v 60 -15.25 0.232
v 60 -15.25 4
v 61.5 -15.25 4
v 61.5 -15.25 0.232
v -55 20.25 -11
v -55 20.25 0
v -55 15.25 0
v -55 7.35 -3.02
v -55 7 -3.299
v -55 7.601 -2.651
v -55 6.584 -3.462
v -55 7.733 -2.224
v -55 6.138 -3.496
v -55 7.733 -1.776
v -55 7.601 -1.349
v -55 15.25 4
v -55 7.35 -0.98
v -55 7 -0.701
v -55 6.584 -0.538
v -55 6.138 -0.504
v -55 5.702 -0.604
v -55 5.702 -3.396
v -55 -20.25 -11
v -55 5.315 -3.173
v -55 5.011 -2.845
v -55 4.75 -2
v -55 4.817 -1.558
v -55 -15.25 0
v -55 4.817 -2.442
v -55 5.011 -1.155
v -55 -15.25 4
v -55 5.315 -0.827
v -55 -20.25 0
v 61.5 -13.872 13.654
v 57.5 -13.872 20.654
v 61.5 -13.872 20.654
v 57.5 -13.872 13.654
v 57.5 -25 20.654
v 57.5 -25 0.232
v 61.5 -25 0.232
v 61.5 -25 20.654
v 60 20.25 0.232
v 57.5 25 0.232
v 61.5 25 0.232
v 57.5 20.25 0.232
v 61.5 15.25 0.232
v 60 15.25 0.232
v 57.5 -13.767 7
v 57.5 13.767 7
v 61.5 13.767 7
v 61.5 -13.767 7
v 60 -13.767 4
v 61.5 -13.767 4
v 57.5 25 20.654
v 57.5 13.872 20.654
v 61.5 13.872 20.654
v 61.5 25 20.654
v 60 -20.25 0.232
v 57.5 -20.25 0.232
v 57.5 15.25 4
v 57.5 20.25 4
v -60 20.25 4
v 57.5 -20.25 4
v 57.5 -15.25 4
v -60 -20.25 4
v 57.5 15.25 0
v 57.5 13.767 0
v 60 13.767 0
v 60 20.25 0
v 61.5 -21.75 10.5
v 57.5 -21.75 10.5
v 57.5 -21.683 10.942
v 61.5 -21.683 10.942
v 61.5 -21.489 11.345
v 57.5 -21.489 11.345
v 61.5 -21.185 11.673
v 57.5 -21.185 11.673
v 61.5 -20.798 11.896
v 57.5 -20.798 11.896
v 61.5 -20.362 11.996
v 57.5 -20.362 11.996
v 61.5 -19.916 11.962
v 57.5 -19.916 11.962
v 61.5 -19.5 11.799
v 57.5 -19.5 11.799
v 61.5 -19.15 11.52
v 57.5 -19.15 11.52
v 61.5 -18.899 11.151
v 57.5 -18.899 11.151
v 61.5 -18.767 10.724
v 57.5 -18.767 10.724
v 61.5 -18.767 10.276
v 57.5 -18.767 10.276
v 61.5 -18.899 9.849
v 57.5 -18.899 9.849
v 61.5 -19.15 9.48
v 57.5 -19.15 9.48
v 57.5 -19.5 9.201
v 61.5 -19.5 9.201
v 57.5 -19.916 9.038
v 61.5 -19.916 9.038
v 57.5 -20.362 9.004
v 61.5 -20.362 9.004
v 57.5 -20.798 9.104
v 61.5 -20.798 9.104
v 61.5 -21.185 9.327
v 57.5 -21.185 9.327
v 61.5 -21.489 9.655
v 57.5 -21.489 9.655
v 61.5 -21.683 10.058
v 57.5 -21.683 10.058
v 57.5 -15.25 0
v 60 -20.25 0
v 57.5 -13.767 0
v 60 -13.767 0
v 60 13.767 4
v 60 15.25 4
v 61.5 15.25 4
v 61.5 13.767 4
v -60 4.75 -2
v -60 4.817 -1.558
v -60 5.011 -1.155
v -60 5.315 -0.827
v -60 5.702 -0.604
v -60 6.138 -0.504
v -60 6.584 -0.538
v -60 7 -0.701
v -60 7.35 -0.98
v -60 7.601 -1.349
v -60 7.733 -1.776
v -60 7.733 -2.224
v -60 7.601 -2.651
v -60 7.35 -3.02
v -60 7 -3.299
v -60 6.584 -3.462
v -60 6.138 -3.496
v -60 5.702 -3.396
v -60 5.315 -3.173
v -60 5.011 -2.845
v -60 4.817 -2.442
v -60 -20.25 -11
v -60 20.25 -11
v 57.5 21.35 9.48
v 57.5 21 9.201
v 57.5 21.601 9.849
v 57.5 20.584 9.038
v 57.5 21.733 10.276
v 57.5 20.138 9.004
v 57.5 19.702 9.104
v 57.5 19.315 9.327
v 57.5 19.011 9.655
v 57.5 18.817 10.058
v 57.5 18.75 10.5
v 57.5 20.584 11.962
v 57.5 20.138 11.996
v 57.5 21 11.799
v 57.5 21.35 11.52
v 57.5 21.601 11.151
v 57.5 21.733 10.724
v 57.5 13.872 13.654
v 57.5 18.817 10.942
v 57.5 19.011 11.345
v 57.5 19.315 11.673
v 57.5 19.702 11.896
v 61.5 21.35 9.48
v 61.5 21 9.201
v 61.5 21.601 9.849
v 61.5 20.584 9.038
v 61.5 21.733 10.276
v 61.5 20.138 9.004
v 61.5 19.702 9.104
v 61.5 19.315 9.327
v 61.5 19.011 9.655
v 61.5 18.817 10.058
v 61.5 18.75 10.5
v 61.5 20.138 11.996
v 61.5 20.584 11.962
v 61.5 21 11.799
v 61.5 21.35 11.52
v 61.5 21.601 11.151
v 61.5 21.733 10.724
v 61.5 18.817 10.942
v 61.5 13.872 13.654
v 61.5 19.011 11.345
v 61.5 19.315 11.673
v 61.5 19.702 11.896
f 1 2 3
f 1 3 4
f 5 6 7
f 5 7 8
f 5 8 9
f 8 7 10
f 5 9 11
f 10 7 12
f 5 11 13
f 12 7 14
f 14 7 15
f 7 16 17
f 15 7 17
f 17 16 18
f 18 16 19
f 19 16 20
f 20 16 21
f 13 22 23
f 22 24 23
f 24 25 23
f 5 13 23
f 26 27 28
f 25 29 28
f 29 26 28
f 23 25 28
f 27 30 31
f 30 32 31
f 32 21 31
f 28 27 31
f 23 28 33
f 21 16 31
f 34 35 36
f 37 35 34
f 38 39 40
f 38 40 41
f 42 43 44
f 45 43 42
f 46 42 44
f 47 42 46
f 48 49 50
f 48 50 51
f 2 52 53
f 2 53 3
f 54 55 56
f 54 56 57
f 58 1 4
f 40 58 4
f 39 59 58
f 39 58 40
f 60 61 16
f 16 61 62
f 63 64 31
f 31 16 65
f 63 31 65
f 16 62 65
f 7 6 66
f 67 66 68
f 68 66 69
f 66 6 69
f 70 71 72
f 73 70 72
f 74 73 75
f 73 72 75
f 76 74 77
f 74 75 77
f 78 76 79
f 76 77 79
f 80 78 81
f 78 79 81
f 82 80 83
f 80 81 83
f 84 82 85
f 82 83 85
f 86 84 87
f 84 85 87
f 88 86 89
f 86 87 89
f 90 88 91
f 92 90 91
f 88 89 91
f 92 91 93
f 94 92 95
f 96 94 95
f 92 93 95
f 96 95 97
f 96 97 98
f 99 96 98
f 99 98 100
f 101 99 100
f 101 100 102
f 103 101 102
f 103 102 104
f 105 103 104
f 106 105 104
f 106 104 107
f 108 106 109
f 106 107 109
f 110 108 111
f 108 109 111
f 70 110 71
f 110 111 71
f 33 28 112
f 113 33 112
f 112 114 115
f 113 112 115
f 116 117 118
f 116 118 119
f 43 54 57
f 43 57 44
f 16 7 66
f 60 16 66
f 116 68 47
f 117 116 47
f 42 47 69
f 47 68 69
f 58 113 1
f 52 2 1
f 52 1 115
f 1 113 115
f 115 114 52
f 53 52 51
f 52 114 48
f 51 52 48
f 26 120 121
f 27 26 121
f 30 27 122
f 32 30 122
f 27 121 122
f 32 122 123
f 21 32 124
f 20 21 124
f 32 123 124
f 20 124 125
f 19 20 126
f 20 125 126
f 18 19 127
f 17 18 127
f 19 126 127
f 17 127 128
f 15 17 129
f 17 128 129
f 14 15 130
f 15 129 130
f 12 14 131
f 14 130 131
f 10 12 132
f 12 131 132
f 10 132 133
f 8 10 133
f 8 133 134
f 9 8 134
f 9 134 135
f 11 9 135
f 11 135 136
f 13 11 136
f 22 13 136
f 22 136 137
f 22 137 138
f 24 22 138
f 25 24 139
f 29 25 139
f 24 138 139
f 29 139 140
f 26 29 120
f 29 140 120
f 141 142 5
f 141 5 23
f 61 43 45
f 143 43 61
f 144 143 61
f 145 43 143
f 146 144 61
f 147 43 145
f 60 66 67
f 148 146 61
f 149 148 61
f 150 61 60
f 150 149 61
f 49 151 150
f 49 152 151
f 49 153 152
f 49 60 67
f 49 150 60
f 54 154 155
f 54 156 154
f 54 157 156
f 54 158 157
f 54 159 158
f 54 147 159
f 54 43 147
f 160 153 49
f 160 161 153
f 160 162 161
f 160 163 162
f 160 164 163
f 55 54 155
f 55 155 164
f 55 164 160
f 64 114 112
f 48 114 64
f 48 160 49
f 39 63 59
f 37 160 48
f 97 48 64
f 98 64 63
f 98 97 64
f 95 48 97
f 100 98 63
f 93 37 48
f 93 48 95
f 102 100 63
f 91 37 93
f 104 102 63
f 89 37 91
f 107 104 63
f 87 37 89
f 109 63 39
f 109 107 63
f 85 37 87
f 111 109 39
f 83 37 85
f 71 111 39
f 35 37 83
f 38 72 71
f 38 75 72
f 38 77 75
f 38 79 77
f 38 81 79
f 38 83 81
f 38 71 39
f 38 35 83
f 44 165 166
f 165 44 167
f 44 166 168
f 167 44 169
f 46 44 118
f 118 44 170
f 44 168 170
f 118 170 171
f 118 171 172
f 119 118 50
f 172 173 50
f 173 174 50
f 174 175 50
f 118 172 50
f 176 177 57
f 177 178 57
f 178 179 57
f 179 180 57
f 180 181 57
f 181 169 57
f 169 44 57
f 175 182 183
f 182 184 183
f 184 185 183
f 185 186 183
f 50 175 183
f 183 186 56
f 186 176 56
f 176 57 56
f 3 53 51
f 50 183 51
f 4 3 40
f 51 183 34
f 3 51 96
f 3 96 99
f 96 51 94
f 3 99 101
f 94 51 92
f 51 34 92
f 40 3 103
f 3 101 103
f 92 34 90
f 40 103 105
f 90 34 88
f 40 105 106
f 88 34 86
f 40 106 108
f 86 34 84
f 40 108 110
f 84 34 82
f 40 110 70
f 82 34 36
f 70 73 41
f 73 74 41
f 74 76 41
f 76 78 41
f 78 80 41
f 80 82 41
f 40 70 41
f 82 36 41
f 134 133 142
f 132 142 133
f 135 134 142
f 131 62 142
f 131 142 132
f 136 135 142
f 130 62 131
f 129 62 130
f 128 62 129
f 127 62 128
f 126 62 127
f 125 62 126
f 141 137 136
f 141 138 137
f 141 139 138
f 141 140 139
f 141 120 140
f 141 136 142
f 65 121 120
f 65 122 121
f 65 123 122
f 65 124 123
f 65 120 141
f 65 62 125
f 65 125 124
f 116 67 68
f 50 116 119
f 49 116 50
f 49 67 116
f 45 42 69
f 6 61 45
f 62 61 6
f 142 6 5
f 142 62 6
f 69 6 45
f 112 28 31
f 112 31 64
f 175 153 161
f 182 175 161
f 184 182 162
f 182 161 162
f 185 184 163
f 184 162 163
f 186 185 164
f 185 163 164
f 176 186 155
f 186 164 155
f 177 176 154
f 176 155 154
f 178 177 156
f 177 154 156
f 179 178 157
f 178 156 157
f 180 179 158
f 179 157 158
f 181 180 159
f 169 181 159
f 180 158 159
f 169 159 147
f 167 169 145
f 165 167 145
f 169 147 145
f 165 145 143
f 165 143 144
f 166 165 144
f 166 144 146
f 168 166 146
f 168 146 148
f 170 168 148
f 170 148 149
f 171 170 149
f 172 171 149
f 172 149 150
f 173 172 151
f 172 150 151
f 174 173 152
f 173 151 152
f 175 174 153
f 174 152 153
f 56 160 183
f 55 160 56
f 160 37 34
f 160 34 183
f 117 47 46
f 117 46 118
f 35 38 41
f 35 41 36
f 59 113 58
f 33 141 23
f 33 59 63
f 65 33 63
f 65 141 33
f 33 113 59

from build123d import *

# Parameters (mm, degrees)
F0_W     = 120
F0_H     = 40.5
F0_W_2   = 115
F0_H_2   = 30.5
F1_DEPTH = 4
F2_W     = 40.5
F2_H     = 11.0000007078
F2_R     = 1.5
F2_H_2   = 4
F3_DEPTH = 5
F4_R     = 1.5
F5_DEPTH = 4
F4_W     = 27.5345724076
F4_H     = 3
F4_H_2   = 0.2320672698
F4_H_3   = 7
F4_H_4   = 3.7679327302
F6_DEPTH = 4.001


with BuildPart() as f1:
    # F0 (on Top) → F1 (new body)
    with BuildSketch(Plane.XY):
        Rectangle(F0_W, F0_H)
        Rectangle(F0_W_2, F0_H_2, mode=Mode.SUBTRACT)
    extrude(amount=F1_DEPTH)

    # F2 (on face) → F3 (join)
    with BuildSketch(Plane(origin=(-60, 0, 0), x_dir=(0, -1, 0), z_dir=(-1, 0, 0))):
        with Locations((0, -5.5000003539)):
            Rectangle(F2_W, F2_H)
        with Locations((-6.25, -2)):
            Circle(F2_R, mode=Mode.SUBTRACT)
        with Locations((0, 2)):
            Rectangle(F2_W, F2_H_2)
    extrude(amount=-F3_DEPTH)

    # F4 (on face) → F5 (join)
    with BuildSketch(Plane(origin=(57.5, 0, 0), x_dir=(0, -1, 0), z_dir=(-1, 0, 0))):
        Polygon((25, 0.2320672698), (25, 20.6540079332), (13.8721717522, 20.6540079332), (13.8721717522, 13.6540079332), (-13.8721717522, 13.6540079332), (-13.8721717522, 20.6540079332), (-25, 20.6540079332), (-25, 0.2320672698), (-15.25, 0.2320672698), (-15.25, 4), (-13.7672862038, 4), (-13.7672862038, 7), (13.7672862038, 7), (13.7672862038, 4), (15.25, 4), (15.25, 0.2320672698), align=None)
        with Locations((-20.25, 10.5)):
            Circle(F4_R, mode=Mode.SUBTRACT)
        with Locations((20.25, 10.5)):
            Circle(F4_R, mode=Mode.SUBTRACT)
    extrude(amount=-F5_DEPTH)

    # F4 (on face) → F6 (cut, through all)
    with BuildSketch(Plane(origin=(57.5, 0, 0), x_dir=(0, -1, 0), z_dir=(-1, 0, 0))):
        with Locations((0, 5.5)):
            Rectangle(F4_W, F4_H)
        with Locations((0, 0.1160336349)):
            Rectangle(F4_W, F4_H_2)
        with Locations((0, -3.5)):
            Rectangle(F4_W, F4_H_3)
        with Locations((0, 2.1160336349)):
            Rectangle(F4_W, F4_H_4)
    extrude(amount=-F6_DEPTH, mode=Mode.SUBTRACT)


solid = f1.part
